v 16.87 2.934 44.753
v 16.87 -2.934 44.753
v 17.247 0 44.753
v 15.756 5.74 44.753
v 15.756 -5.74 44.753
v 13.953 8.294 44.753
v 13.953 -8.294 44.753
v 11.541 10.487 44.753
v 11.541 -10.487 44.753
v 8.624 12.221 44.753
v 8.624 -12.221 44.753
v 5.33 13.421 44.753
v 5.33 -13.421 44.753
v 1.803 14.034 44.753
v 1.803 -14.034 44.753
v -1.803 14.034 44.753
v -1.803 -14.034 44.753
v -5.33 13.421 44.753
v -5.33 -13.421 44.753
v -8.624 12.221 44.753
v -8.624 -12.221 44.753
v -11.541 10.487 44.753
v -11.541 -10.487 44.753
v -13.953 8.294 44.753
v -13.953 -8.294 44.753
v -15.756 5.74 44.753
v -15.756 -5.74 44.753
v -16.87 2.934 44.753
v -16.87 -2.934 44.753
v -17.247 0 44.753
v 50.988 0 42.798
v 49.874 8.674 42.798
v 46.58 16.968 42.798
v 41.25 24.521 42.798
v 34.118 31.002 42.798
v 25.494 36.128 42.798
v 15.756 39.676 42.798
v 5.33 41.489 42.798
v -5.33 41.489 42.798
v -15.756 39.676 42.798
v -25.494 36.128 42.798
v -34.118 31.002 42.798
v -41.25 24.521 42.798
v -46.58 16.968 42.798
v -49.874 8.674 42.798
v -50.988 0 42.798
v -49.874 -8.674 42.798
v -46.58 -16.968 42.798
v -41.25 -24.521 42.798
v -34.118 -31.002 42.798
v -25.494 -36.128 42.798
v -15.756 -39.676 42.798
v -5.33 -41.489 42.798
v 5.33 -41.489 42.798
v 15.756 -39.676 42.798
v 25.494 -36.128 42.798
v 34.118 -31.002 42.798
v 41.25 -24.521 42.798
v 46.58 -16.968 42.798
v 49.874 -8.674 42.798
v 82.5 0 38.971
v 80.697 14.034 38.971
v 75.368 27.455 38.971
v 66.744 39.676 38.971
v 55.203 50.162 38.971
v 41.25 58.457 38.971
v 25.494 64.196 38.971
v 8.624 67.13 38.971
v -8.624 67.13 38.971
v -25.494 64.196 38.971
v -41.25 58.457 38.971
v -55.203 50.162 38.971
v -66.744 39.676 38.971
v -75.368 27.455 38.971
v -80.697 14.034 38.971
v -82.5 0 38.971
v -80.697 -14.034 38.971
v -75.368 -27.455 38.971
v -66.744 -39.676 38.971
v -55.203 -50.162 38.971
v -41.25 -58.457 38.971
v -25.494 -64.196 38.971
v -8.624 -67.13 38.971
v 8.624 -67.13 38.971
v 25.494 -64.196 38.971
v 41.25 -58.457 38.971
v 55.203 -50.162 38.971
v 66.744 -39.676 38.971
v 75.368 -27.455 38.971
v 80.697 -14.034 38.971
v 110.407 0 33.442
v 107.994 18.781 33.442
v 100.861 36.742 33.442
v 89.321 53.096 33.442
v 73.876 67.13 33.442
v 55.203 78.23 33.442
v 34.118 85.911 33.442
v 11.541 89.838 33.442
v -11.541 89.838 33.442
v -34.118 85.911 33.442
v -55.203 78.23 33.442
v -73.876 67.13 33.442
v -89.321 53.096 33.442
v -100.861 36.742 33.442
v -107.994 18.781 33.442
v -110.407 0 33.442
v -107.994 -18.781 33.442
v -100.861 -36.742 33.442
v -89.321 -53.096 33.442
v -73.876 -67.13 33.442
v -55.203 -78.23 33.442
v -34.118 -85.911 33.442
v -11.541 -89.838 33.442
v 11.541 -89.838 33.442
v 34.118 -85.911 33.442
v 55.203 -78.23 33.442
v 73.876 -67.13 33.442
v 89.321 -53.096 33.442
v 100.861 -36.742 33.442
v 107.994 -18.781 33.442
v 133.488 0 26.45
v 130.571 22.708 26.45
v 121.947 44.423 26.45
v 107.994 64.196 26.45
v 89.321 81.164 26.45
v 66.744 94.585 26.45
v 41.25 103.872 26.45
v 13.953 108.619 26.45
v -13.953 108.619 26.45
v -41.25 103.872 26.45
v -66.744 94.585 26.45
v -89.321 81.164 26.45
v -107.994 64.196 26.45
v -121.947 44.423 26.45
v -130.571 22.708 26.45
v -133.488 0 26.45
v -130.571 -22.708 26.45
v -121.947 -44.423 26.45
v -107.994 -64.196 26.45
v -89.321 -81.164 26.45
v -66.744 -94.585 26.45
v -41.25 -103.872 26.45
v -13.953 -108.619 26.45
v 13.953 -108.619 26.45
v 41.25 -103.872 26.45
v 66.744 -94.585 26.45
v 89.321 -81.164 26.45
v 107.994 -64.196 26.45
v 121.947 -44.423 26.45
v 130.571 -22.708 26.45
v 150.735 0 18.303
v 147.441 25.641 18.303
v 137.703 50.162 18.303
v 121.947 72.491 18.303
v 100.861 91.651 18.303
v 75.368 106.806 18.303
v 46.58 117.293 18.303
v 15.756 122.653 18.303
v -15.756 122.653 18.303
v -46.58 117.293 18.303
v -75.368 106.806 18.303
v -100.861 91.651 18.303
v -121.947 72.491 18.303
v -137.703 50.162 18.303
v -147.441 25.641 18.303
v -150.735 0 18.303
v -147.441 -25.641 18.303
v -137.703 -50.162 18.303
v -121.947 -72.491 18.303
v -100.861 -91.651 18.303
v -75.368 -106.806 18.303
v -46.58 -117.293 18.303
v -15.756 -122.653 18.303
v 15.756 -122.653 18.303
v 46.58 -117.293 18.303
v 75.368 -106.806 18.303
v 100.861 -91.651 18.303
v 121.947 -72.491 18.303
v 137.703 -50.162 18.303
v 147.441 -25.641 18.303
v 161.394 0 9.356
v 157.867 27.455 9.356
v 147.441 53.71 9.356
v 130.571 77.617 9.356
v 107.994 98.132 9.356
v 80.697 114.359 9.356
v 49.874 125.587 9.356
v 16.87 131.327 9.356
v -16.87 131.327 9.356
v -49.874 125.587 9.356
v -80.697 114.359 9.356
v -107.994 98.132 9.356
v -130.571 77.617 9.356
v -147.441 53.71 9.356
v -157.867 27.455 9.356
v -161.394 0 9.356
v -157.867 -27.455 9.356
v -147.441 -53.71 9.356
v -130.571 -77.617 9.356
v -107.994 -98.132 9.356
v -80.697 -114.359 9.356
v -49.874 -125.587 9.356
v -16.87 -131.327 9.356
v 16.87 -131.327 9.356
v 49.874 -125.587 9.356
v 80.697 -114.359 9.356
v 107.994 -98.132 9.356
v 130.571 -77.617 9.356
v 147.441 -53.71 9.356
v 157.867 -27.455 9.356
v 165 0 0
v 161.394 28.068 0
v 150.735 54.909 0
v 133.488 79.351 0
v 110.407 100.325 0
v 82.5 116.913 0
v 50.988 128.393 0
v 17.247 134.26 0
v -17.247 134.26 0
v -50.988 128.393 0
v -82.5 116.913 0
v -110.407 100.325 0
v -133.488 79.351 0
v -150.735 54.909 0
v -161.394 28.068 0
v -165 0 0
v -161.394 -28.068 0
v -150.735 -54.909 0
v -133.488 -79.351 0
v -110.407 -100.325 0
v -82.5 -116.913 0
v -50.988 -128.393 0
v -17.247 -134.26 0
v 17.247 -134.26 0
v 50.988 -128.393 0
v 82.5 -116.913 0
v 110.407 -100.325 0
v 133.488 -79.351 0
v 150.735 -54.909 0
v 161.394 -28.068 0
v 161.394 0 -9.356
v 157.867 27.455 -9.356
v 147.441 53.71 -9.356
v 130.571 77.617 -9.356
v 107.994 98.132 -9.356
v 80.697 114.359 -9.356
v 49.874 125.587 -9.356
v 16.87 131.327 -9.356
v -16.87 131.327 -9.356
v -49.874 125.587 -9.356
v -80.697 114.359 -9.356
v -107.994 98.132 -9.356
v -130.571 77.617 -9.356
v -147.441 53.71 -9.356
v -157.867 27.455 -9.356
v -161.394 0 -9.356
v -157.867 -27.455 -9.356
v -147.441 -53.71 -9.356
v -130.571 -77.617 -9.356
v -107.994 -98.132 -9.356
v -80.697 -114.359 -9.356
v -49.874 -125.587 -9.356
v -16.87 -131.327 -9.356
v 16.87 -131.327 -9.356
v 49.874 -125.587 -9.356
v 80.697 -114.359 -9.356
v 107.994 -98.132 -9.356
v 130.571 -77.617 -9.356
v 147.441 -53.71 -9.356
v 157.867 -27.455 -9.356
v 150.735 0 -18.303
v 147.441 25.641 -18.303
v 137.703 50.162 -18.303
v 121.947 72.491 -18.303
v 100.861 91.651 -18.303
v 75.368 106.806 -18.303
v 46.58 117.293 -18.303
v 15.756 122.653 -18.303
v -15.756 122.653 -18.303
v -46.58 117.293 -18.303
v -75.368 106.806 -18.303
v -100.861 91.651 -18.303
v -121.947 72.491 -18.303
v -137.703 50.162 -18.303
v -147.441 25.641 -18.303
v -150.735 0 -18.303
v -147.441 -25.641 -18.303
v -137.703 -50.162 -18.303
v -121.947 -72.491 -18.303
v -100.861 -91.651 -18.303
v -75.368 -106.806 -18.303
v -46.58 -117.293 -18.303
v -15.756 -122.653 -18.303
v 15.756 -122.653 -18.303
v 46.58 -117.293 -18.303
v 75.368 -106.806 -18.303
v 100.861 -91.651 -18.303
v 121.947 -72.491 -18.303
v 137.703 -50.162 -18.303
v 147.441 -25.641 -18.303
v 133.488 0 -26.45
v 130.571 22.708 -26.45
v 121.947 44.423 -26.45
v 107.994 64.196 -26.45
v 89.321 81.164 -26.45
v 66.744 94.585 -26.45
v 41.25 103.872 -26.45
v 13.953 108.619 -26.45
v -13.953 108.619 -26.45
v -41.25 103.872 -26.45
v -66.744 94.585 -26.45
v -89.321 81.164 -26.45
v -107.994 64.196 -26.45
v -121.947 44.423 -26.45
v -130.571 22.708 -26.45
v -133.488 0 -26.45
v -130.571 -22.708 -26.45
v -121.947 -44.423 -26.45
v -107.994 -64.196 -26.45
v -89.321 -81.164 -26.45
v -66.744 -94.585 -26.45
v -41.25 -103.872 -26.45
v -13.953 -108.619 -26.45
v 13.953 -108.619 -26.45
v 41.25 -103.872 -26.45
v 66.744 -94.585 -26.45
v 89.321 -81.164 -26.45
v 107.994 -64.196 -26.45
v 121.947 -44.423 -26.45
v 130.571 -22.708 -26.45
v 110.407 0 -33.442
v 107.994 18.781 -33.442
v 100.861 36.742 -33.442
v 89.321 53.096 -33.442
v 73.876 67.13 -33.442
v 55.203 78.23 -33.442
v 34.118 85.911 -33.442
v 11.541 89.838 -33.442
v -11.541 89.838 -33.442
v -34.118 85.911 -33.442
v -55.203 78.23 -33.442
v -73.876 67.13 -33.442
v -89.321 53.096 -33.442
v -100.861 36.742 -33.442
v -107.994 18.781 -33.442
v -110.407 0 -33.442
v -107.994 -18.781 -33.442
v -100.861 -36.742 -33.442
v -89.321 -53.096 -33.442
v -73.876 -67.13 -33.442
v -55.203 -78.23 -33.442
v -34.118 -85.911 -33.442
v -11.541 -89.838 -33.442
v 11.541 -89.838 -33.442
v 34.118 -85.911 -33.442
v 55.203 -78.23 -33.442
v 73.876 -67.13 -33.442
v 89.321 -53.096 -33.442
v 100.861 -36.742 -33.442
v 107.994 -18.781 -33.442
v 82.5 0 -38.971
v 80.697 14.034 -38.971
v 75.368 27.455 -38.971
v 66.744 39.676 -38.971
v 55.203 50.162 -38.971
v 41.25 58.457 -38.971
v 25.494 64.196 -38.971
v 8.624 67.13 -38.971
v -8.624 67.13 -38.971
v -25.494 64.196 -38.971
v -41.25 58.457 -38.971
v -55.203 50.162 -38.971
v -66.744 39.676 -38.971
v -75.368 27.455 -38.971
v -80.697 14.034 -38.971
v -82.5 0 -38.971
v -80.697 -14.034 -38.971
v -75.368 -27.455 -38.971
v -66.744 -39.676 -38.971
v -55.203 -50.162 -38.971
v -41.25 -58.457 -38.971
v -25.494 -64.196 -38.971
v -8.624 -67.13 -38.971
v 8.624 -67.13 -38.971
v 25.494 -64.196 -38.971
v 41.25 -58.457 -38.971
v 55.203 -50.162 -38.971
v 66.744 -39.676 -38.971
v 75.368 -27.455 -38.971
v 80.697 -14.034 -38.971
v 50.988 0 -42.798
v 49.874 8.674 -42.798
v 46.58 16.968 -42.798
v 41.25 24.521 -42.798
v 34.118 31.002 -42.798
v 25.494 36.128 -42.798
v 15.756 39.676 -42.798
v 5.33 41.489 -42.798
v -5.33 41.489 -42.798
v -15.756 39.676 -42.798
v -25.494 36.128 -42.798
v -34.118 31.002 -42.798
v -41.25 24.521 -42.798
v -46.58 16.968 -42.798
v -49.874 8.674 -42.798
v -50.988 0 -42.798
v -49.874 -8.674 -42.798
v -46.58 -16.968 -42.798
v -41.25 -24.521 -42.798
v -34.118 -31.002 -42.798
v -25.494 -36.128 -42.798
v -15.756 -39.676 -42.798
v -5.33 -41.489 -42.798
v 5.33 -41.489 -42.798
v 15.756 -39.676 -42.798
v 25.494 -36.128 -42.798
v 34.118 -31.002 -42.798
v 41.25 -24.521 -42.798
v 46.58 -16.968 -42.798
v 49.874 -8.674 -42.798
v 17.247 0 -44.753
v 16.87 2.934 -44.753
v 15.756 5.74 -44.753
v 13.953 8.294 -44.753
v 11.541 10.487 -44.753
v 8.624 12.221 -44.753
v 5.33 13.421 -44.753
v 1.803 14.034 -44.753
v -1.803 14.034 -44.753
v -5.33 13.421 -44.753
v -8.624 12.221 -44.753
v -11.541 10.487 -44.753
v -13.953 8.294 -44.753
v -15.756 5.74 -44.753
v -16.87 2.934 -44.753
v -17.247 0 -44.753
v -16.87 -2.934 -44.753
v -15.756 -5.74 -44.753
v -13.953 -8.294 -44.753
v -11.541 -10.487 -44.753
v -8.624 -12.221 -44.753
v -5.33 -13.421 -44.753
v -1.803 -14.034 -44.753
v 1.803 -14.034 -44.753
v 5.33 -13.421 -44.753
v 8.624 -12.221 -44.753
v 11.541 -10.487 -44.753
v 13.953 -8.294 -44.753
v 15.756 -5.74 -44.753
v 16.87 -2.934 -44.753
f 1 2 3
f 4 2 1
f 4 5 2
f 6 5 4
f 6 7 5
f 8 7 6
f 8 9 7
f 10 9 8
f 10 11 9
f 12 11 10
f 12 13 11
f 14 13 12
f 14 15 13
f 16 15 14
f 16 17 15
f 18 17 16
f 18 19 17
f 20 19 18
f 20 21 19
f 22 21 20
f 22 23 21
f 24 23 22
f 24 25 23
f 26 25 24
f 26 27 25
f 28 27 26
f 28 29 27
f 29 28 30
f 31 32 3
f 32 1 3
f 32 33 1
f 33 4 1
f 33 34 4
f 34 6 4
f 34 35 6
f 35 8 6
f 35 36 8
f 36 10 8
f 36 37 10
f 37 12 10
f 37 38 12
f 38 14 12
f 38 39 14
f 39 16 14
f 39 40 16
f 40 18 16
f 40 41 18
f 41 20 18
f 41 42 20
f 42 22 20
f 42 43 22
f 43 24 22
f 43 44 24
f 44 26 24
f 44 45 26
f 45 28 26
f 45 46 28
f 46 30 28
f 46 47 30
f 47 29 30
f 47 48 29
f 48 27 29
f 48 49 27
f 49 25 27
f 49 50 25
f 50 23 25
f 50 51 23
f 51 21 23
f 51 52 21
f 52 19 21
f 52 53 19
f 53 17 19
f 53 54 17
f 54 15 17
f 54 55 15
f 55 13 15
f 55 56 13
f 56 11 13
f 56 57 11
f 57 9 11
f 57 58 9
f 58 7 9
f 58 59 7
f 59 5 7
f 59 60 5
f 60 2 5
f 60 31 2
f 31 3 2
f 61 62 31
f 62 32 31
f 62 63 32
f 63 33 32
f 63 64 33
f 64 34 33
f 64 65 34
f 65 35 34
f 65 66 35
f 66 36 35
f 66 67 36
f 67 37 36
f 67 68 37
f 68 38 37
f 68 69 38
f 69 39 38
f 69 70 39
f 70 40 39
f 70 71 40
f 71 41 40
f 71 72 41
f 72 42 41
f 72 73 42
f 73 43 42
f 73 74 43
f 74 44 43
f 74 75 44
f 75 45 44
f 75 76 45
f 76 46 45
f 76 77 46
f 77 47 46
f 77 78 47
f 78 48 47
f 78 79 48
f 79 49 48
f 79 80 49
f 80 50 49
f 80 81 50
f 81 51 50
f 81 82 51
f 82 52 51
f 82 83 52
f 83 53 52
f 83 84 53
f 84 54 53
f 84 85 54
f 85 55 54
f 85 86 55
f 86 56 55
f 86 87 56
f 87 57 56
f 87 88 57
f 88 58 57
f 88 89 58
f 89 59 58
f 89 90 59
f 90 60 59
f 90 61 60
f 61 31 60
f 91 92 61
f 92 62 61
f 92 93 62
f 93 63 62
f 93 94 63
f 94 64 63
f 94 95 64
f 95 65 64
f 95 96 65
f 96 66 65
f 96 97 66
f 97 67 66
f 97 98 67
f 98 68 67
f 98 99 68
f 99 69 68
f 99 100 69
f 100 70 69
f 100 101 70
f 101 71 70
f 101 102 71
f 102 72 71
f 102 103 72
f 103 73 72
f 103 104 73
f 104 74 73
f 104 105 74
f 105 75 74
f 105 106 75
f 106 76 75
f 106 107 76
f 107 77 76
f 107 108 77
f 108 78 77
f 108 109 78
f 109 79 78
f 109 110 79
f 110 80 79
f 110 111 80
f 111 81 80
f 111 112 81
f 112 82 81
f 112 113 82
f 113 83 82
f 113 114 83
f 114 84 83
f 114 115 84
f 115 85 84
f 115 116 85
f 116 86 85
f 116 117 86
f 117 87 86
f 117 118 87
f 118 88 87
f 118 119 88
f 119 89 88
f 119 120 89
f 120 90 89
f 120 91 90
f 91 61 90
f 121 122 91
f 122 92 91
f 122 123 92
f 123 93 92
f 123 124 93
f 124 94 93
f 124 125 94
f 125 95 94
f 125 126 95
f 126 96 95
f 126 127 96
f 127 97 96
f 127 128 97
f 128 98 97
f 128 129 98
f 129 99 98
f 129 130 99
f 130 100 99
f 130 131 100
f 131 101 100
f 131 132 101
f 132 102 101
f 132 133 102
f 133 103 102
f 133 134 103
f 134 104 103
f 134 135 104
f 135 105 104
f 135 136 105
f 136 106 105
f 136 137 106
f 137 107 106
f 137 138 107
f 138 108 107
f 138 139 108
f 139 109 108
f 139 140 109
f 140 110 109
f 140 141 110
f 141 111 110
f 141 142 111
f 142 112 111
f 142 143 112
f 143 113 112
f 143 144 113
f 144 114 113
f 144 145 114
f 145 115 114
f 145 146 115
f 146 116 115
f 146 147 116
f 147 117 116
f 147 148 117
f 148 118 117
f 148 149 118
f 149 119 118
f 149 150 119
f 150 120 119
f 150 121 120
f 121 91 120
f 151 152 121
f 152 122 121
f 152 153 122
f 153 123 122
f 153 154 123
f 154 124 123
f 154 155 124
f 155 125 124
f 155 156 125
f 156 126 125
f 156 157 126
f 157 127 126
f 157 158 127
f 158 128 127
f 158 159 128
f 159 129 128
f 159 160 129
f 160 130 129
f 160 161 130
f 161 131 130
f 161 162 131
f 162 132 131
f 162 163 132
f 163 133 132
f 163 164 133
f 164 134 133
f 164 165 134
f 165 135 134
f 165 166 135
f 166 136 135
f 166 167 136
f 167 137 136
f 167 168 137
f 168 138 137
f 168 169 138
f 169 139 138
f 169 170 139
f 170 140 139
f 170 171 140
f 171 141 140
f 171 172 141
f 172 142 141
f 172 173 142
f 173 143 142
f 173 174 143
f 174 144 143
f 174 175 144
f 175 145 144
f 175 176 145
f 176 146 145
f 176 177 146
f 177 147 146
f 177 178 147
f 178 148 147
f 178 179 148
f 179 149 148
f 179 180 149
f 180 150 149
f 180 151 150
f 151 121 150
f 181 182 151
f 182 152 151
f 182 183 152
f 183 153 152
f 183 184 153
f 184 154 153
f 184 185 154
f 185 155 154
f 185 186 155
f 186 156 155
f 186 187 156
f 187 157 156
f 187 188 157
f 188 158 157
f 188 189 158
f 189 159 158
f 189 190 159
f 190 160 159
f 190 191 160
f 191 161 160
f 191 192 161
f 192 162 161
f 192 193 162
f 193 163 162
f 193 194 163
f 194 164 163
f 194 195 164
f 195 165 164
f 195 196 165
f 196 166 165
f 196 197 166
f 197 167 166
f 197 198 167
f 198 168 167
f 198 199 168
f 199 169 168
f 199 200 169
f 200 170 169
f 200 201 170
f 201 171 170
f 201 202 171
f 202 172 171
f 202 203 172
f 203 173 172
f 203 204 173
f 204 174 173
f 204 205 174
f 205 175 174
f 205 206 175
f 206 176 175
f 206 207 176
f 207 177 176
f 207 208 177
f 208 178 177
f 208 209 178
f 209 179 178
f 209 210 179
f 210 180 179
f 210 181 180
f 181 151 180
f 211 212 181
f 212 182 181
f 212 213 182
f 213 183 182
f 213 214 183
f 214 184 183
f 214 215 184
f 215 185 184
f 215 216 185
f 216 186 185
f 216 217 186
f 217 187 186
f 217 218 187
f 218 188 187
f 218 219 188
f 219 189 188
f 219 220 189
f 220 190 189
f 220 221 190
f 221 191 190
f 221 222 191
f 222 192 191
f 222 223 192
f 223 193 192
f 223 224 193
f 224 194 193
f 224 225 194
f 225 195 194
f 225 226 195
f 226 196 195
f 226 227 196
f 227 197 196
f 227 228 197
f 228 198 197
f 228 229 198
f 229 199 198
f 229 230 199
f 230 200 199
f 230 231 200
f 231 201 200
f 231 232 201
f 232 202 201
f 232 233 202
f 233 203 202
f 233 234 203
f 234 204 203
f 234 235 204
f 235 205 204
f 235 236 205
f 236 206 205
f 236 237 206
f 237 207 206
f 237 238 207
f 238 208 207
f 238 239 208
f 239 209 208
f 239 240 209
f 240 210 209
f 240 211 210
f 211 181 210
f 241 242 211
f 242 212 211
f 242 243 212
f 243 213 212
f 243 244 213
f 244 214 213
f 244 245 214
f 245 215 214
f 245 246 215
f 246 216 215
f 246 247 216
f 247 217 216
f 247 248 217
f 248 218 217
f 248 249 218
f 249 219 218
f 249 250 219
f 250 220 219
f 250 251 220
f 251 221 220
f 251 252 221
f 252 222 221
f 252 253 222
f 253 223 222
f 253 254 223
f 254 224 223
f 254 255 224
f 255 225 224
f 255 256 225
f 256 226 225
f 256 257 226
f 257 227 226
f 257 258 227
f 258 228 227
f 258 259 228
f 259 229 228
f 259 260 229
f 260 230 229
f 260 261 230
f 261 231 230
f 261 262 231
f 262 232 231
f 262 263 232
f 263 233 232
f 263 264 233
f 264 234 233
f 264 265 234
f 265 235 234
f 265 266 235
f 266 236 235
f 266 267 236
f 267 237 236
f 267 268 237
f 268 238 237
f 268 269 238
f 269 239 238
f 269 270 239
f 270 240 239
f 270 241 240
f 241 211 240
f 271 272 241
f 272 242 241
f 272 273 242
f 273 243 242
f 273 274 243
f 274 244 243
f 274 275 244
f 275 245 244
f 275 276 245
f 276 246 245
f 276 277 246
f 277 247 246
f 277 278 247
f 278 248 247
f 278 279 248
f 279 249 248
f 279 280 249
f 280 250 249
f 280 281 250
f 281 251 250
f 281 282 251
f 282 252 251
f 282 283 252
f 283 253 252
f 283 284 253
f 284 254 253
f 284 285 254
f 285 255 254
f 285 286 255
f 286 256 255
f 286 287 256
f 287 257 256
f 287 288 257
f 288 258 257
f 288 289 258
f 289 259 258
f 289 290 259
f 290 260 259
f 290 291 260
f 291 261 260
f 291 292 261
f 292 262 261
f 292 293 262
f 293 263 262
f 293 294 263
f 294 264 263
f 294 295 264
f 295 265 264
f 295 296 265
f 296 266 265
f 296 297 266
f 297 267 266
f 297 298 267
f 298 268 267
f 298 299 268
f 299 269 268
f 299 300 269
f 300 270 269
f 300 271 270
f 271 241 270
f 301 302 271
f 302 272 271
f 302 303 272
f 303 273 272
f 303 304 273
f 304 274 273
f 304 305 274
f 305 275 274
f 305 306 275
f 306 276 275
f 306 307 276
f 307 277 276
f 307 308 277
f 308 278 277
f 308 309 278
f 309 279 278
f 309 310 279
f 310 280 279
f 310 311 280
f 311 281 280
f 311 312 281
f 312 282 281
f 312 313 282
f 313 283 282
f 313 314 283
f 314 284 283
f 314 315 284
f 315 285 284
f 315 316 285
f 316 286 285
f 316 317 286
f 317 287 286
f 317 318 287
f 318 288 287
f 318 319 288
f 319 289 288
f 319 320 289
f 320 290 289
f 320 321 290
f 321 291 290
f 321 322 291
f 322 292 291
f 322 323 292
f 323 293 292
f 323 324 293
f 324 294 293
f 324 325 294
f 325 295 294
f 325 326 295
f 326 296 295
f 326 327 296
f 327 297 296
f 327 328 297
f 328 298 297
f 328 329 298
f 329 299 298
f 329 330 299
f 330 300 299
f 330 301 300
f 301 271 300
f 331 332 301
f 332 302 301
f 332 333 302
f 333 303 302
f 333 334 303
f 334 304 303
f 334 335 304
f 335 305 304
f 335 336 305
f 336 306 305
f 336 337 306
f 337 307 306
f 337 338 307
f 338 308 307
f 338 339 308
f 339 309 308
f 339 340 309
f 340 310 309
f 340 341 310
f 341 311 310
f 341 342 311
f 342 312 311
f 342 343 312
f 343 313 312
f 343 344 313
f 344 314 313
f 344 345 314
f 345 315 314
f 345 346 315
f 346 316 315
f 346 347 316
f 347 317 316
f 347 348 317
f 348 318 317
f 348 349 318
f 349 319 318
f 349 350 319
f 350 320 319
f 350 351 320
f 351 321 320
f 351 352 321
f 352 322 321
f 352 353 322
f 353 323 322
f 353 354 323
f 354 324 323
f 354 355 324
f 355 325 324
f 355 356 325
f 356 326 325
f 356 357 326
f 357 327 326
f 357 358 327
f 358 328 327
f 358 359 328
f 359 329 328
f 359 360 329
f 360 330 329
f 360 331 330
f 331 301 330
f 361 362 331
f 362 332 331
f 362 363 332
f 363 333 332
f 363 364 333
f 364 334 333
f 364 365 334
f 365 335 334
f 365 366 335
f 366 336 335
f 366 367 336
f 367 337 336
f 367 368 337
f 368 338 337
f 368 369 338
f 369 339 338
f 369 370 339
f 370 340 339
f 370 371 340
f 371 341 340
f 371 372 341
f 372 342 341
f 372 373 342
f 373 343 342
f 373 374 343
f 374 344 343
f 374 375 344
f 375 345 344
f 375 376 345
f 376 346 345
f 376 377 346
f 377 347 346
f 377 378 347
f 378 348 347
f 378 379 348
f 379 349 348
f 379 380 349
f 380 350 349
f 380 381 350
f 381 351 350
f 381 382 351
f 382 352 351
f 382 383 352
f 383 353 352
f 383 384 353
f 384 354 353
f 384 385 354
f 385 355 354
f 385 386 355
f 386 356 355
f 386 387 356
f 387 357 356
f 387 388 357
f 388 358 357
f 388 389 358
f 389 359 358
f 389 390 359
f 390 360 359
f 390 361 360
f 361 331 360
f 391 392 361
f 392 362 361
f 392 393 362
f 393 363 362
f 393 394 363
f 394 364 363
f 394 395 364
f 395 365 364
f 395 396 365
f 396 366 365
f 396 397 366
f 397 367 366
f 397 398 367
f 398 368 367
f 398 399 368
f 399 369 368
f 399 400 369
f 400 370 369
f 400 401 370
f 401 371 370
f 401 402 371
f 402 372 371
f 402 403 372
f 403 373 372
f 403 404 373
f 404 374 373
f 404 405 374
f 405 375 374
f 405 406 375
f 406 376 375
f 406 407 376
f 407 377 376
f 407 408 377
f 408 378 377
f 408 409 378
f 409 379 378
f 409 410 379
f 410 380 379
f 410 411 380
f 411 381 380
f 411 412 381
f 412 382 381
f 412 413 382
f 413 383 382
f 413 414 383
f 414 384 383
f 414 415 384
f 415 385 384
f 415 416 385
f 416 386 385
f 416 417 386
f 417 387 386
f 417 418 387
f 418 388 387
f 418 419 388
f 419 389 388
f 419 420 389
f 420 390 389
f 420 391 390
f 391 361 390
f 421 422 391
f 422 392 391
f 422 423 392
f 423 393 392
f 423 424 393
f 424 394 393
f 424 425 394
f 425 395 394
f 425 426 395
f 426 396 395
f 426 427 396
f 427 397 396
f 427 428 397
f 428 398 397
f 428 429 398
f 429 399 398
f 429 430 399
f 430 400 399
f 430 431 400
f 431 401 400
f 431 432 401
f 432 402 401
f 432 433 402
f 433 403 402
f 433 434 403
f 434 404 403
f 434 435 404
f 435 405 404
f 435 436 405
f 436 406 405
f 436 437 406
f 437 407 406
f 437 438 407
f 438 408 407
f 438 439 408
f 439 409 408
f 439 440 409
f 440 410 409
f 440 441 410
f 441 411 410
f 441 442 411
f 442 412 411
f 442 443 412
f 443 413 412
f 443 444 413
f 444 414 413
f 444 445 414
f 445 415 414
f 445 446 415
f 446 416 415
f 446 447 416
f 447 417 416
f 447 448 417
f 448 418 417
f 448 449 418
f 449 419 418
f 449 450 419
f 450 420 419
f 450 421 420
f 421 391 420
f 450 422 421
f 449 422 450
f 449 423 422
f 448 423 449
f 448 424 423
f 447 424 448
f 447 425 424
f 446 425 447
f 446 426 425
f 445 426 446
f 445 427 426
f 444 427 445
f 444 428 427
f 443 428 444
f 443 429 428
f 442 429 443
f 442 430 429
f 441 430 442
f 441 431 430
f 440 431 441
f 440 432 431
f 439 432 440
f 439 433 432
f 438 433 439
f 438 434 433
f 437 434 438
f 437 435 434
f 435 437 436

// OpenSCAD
// Generated by SolidPython 1.0.1 on 2020-07-29 00:46:49


scale(v = [11, 9, 3]) {
	sphere(r = 15);
}
/***********************************************
*********      SolidPython code:      **********
************************************************
 
# import packages: SolidPython
from solid import *
from solid.utils import *
from itertools import chain, combinations, permutations


class Resize:

    def __init__(self, scad_file):
        self.scad_file = scad_file
        #self.scad_file = import_scad(scad_file)
        # cone/cylinder param:
        self.r1 = 0
        self.r2 = 0
        self.h = 0
        # rectangular prism param:
        self.w = 0
        self.l = 0
        # ellipse param:
        self.r = 0

    # import OpenScad code (file name corresponds to shape)


    # classify shape + parameters
    def assign(self, param1, param2, param3):
        if self.scad_file == 'cone.scad':
            self.r1 = param1
            self.r2 = param2
            self.h = param3
        elif self.scad_file == 'cylinder.scad':
            self.r1 = param1
            self.r2 = param2
            self.h = param3
        elif self.scad_file == 'rectangularPrism.scad':
            self.h = param1
            self.l = param2
            self.w = param3
        else:
            self.r = param1
            self.h = param2

    # resize parameters
    def iterate(self):
        x = range(3, 20, 2)
        i = 1
        if self.scad_file == 'cone.scad':
            tempList = list(permutations(x, 2))
            for temp in tempList:
                param1 = temp[0]
                param2 = temp[1]
                filepath = 'produced_scad_files/' + 'cone' + str(param1) + '_' + str(param2) + '_' + '.scad'
                scad_render_to_file(cylinder(h=param1, r1=param2, r2=0), filepath)

        elif self.scad_file == 'cylinder.scad':
            tempList = list(permutations(x, 3))
            for temp in tempList:
                param1 = temp[0]
                param2 = temp[1]
                filepath = 'produced_scad_files/' + 'cylinder' + str(param1) + '_' + str(param2) + '_' + '.scad'
                scad_render_to_file(cylinder(h=param1, r1=param2, r2=param2), filepath)

        elif self.scad_file == 'rectangularPrism.scad':
            tempList = list(permutations(x, 3))
            for temp in tempList:
                param1 = temp[0]
                param2 = temp[1]
                param3 = temp[2]
                filepath = 'produced_scad_files/' + 'rectangularPrism' + str(param1) + '_' + str(param2) + '_' + str(
                    param3) + '.scad'
                scad_render_to_file(cube(size=(param1, param2, param3)), filepath)

        elif self.scad_file == 'ellipse.scad':
            tempList = list(permutations(x, 4))
            for temp in tempList:
                param1 = temp[0]
                param2 = temp[1]
                param3 = temp[2]
                param4 = temp[3]
                filepath = 'produced_scad_files/' + 'ellipse' + str(param1) + '_' + str(param2) + '_' + str(param3) + '_' + str(param4) + '.scad'
                scad_render_to_file(scale([param1, param2, param3])(sphere(r=param4)), filepath)

    def render_to_scadfile(self):
        scad_render_to_file(scad, 'example.scad') 
 
************************************************/
